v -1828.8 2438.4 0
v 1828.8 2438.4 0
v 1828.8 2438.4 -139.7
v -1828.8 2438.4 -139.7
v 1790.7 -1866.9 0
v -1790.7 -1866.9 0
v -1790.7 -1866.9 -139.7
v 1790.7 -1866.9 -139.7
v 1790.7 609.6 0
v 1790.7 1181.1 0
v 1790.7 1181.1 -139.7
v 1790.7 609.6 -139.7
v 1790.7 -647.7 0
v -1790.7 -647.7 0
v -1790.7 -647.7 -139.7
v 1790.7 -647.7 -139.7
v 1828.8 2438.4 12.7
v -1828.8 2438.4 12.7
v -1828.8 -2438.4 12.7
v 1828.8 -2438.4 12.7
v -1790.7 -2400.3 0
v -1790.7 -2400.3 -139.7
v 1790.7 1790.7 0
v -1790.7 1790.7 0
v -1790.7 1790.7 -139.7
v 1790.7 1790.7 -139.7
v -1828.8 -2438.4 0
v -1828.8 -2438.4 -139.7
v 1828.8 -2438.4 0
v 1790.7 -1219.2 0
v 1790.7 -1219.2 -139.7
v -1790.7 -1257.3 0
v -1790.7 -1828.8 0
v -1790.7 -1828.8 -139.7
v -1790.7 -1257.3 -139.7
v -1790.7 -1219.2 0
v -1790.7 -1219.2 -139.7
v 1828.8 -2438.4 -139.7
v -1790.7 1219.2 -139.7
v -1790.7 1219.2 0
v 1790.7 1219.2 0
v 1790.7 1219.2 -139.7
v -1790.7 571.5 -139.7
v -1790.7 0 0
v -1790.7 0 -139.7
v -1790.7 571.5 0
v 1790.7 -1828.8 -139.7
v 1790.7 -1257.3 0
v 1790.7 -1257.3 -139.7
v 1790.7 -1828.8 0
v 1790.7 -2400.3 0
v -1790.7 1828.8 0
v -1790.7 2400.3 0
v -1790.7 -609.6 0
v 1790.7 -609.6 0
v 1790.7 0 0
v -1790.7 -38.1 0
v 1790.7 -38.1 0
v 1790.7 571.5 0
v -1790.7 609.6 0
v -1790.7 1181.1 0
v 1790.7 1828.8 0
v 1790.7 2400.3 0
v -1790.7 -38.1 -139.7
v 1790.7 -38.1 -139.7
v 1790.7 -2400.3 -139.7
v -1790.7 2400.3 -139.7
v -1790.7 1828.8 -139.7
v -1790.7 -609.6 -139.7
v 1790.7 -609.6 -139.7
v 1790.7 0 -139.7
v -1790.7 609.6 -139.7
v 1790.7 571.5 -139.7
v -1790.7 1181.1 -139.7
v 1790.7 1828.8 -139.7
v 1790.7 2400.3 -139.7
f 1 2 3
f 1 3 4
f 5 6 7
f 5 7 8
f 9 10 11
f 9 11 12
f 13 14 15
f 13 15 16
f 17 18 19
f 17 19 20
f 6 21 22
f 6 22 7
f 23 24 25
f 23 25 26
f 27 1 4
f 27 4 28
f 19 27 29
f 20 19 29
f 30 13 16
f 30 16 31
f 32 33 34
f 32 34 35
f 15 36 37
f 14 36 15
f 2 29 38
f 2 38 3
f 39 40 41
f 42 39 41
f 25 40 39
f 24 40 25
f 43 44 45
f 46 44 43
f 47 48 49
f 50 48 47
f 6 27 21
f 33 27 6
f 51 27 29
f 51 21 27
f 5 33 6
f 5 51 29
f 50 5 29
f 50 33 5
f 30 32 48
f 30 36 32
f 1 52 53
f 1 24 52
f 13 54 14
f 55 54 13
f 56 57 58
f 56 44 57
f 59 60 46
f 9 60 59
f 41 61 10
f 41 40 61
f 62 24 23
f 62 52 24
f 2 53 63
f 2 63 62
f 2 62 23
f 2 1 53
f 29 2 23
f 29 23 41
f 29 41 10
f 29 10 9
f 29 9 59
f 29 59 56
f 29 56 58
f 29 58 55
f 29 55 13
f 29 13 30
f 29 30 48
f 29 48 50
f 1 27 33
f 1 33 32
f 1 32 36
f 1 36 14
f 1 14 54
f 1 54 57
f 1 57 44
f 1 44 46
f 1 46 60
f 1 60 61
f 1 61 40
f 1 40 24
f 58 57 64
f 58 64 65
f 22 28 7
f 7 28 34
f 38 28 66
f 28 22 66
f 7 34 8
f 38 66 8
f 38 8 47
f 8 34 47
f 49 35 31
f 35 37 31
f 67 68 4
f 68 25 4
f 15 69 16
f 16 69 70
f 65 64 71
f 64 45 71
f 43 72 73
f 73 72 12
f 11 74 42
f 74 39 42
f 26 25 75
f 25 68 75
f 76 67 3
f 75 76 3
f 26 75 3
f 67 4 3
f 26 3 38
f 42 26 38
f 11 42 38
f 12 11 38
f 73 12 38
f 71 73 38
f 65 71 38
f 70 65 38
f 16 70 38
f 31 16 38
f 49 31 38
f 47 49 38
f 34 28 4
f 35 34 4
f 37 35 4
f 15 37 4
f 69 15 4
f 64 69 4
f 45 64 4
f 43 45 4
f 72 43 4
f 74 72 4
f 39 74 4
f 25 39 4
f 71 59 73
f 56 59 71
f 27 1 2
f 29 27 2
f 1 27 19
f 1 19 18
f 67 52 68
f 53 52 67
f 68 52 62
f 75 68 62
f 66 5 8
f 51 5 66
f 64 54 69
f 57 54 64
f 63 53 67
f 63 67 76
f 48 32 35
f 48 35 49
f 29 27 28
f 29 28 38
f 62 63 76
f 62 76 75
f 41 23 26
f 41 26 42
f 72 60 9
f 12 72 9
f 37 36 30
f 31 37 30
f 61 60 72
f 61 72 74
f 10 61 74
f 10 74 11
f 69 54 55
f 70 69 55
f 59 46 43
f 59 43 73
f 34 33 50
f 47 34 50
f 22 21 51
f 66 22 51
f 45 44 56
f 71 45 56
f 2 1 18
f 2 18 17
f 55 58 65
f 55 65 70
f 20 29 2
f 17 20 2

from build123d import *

# Parameters (mm, degrees)
F0_W     = 3581.4
F0_H     = 38.1
F1_DEPTH = 139.7
F2_W     = 3657.6
F2_H     = 4876.8
F3_DEPTH = 12.7


with BuildPart() as f1:
    # F0 (on Top) → F1 (new body)
    with BuildSketch(Plane.XY):
        with Locations((0, 2419.35)):
            Rectangle(F0_W, F0_H)
        Polygon((-1790.7, 2400.3), (-1790.7, 2438.4), (-1828.8, 2438.4), (-1828.8, -2438.4), (-1790.7, -2438.4), (-1790.7, -2400.3), (-1790.7, -1866.9), (-1790.7, -1828.8), (-1790.7, -1257.3), (-1790.7, -1219.2), (-1790.7, -647.7), (-1790.7, -609.6), (-1790.7, -38.1), (-1790.7, 0), (-1790.7, 571.5), (-1790.7, 609.6), (-1790.7, 1181.1), (-1790.7, 1219.2), (-1790.7, 1790.7), (-1790.7, 1828.8), align=None)
        Polygon((1828.8, 2438.4), (1790.7, 2438.4), (1790.7, 2400.3), (1790.7, 1828.8), (1790.7, 1790.7), (1790.7, 1219.2), (1790.7, 1181.1), (1790.7, 609.6), (1790.7, 571.5), (1790.7, 0), (1790.7, -38.1), (1790.7, -609.6), (1790.7, -647.7), (1790.7, -1219.2), (1790.7, -1257.3), (1790.7, -1828.8), (1790.7, -1866.9), (1790.7, -2400.3), (1790.7, -2438.4), (1828.8, -2438.4), align=None)
        with Locations((0, -2419.35)):
            Rectangle(F0_W, F0_H)
        with Locations((0, -1847.85)):
            Rectangle(F0_W, F0_H)
        with Locations((0, -1238.25)):
            Rectangle(F0_W, F0_H)
        with Locations((0, -628.65)):
            Rectangle(F0_W, F0_H)
        with Locations((0, -19.05)):
            Rectangle(F0_W, F0_H)
        with Locations((0, 590.55)):
            Rectangle(F0_W, F0_H)
        with Locations((0, 1200.15)):
            Rectangle(F0_W, F0_H)
        with Locations((0, 1809.75)):
            Rectangle(F0_W, F0_H)
    extrude(amount=-F1_DEPTH)


with BuildPart() as f3:
    # F2 (on Top) → F3 (new body)
    with BuildSketch(Plane.XY):
        Rectangle(F2_W, F2_H)
    extrude(amount=F3_DEPTH)


solid = Compound([f1.part, f3.part])
